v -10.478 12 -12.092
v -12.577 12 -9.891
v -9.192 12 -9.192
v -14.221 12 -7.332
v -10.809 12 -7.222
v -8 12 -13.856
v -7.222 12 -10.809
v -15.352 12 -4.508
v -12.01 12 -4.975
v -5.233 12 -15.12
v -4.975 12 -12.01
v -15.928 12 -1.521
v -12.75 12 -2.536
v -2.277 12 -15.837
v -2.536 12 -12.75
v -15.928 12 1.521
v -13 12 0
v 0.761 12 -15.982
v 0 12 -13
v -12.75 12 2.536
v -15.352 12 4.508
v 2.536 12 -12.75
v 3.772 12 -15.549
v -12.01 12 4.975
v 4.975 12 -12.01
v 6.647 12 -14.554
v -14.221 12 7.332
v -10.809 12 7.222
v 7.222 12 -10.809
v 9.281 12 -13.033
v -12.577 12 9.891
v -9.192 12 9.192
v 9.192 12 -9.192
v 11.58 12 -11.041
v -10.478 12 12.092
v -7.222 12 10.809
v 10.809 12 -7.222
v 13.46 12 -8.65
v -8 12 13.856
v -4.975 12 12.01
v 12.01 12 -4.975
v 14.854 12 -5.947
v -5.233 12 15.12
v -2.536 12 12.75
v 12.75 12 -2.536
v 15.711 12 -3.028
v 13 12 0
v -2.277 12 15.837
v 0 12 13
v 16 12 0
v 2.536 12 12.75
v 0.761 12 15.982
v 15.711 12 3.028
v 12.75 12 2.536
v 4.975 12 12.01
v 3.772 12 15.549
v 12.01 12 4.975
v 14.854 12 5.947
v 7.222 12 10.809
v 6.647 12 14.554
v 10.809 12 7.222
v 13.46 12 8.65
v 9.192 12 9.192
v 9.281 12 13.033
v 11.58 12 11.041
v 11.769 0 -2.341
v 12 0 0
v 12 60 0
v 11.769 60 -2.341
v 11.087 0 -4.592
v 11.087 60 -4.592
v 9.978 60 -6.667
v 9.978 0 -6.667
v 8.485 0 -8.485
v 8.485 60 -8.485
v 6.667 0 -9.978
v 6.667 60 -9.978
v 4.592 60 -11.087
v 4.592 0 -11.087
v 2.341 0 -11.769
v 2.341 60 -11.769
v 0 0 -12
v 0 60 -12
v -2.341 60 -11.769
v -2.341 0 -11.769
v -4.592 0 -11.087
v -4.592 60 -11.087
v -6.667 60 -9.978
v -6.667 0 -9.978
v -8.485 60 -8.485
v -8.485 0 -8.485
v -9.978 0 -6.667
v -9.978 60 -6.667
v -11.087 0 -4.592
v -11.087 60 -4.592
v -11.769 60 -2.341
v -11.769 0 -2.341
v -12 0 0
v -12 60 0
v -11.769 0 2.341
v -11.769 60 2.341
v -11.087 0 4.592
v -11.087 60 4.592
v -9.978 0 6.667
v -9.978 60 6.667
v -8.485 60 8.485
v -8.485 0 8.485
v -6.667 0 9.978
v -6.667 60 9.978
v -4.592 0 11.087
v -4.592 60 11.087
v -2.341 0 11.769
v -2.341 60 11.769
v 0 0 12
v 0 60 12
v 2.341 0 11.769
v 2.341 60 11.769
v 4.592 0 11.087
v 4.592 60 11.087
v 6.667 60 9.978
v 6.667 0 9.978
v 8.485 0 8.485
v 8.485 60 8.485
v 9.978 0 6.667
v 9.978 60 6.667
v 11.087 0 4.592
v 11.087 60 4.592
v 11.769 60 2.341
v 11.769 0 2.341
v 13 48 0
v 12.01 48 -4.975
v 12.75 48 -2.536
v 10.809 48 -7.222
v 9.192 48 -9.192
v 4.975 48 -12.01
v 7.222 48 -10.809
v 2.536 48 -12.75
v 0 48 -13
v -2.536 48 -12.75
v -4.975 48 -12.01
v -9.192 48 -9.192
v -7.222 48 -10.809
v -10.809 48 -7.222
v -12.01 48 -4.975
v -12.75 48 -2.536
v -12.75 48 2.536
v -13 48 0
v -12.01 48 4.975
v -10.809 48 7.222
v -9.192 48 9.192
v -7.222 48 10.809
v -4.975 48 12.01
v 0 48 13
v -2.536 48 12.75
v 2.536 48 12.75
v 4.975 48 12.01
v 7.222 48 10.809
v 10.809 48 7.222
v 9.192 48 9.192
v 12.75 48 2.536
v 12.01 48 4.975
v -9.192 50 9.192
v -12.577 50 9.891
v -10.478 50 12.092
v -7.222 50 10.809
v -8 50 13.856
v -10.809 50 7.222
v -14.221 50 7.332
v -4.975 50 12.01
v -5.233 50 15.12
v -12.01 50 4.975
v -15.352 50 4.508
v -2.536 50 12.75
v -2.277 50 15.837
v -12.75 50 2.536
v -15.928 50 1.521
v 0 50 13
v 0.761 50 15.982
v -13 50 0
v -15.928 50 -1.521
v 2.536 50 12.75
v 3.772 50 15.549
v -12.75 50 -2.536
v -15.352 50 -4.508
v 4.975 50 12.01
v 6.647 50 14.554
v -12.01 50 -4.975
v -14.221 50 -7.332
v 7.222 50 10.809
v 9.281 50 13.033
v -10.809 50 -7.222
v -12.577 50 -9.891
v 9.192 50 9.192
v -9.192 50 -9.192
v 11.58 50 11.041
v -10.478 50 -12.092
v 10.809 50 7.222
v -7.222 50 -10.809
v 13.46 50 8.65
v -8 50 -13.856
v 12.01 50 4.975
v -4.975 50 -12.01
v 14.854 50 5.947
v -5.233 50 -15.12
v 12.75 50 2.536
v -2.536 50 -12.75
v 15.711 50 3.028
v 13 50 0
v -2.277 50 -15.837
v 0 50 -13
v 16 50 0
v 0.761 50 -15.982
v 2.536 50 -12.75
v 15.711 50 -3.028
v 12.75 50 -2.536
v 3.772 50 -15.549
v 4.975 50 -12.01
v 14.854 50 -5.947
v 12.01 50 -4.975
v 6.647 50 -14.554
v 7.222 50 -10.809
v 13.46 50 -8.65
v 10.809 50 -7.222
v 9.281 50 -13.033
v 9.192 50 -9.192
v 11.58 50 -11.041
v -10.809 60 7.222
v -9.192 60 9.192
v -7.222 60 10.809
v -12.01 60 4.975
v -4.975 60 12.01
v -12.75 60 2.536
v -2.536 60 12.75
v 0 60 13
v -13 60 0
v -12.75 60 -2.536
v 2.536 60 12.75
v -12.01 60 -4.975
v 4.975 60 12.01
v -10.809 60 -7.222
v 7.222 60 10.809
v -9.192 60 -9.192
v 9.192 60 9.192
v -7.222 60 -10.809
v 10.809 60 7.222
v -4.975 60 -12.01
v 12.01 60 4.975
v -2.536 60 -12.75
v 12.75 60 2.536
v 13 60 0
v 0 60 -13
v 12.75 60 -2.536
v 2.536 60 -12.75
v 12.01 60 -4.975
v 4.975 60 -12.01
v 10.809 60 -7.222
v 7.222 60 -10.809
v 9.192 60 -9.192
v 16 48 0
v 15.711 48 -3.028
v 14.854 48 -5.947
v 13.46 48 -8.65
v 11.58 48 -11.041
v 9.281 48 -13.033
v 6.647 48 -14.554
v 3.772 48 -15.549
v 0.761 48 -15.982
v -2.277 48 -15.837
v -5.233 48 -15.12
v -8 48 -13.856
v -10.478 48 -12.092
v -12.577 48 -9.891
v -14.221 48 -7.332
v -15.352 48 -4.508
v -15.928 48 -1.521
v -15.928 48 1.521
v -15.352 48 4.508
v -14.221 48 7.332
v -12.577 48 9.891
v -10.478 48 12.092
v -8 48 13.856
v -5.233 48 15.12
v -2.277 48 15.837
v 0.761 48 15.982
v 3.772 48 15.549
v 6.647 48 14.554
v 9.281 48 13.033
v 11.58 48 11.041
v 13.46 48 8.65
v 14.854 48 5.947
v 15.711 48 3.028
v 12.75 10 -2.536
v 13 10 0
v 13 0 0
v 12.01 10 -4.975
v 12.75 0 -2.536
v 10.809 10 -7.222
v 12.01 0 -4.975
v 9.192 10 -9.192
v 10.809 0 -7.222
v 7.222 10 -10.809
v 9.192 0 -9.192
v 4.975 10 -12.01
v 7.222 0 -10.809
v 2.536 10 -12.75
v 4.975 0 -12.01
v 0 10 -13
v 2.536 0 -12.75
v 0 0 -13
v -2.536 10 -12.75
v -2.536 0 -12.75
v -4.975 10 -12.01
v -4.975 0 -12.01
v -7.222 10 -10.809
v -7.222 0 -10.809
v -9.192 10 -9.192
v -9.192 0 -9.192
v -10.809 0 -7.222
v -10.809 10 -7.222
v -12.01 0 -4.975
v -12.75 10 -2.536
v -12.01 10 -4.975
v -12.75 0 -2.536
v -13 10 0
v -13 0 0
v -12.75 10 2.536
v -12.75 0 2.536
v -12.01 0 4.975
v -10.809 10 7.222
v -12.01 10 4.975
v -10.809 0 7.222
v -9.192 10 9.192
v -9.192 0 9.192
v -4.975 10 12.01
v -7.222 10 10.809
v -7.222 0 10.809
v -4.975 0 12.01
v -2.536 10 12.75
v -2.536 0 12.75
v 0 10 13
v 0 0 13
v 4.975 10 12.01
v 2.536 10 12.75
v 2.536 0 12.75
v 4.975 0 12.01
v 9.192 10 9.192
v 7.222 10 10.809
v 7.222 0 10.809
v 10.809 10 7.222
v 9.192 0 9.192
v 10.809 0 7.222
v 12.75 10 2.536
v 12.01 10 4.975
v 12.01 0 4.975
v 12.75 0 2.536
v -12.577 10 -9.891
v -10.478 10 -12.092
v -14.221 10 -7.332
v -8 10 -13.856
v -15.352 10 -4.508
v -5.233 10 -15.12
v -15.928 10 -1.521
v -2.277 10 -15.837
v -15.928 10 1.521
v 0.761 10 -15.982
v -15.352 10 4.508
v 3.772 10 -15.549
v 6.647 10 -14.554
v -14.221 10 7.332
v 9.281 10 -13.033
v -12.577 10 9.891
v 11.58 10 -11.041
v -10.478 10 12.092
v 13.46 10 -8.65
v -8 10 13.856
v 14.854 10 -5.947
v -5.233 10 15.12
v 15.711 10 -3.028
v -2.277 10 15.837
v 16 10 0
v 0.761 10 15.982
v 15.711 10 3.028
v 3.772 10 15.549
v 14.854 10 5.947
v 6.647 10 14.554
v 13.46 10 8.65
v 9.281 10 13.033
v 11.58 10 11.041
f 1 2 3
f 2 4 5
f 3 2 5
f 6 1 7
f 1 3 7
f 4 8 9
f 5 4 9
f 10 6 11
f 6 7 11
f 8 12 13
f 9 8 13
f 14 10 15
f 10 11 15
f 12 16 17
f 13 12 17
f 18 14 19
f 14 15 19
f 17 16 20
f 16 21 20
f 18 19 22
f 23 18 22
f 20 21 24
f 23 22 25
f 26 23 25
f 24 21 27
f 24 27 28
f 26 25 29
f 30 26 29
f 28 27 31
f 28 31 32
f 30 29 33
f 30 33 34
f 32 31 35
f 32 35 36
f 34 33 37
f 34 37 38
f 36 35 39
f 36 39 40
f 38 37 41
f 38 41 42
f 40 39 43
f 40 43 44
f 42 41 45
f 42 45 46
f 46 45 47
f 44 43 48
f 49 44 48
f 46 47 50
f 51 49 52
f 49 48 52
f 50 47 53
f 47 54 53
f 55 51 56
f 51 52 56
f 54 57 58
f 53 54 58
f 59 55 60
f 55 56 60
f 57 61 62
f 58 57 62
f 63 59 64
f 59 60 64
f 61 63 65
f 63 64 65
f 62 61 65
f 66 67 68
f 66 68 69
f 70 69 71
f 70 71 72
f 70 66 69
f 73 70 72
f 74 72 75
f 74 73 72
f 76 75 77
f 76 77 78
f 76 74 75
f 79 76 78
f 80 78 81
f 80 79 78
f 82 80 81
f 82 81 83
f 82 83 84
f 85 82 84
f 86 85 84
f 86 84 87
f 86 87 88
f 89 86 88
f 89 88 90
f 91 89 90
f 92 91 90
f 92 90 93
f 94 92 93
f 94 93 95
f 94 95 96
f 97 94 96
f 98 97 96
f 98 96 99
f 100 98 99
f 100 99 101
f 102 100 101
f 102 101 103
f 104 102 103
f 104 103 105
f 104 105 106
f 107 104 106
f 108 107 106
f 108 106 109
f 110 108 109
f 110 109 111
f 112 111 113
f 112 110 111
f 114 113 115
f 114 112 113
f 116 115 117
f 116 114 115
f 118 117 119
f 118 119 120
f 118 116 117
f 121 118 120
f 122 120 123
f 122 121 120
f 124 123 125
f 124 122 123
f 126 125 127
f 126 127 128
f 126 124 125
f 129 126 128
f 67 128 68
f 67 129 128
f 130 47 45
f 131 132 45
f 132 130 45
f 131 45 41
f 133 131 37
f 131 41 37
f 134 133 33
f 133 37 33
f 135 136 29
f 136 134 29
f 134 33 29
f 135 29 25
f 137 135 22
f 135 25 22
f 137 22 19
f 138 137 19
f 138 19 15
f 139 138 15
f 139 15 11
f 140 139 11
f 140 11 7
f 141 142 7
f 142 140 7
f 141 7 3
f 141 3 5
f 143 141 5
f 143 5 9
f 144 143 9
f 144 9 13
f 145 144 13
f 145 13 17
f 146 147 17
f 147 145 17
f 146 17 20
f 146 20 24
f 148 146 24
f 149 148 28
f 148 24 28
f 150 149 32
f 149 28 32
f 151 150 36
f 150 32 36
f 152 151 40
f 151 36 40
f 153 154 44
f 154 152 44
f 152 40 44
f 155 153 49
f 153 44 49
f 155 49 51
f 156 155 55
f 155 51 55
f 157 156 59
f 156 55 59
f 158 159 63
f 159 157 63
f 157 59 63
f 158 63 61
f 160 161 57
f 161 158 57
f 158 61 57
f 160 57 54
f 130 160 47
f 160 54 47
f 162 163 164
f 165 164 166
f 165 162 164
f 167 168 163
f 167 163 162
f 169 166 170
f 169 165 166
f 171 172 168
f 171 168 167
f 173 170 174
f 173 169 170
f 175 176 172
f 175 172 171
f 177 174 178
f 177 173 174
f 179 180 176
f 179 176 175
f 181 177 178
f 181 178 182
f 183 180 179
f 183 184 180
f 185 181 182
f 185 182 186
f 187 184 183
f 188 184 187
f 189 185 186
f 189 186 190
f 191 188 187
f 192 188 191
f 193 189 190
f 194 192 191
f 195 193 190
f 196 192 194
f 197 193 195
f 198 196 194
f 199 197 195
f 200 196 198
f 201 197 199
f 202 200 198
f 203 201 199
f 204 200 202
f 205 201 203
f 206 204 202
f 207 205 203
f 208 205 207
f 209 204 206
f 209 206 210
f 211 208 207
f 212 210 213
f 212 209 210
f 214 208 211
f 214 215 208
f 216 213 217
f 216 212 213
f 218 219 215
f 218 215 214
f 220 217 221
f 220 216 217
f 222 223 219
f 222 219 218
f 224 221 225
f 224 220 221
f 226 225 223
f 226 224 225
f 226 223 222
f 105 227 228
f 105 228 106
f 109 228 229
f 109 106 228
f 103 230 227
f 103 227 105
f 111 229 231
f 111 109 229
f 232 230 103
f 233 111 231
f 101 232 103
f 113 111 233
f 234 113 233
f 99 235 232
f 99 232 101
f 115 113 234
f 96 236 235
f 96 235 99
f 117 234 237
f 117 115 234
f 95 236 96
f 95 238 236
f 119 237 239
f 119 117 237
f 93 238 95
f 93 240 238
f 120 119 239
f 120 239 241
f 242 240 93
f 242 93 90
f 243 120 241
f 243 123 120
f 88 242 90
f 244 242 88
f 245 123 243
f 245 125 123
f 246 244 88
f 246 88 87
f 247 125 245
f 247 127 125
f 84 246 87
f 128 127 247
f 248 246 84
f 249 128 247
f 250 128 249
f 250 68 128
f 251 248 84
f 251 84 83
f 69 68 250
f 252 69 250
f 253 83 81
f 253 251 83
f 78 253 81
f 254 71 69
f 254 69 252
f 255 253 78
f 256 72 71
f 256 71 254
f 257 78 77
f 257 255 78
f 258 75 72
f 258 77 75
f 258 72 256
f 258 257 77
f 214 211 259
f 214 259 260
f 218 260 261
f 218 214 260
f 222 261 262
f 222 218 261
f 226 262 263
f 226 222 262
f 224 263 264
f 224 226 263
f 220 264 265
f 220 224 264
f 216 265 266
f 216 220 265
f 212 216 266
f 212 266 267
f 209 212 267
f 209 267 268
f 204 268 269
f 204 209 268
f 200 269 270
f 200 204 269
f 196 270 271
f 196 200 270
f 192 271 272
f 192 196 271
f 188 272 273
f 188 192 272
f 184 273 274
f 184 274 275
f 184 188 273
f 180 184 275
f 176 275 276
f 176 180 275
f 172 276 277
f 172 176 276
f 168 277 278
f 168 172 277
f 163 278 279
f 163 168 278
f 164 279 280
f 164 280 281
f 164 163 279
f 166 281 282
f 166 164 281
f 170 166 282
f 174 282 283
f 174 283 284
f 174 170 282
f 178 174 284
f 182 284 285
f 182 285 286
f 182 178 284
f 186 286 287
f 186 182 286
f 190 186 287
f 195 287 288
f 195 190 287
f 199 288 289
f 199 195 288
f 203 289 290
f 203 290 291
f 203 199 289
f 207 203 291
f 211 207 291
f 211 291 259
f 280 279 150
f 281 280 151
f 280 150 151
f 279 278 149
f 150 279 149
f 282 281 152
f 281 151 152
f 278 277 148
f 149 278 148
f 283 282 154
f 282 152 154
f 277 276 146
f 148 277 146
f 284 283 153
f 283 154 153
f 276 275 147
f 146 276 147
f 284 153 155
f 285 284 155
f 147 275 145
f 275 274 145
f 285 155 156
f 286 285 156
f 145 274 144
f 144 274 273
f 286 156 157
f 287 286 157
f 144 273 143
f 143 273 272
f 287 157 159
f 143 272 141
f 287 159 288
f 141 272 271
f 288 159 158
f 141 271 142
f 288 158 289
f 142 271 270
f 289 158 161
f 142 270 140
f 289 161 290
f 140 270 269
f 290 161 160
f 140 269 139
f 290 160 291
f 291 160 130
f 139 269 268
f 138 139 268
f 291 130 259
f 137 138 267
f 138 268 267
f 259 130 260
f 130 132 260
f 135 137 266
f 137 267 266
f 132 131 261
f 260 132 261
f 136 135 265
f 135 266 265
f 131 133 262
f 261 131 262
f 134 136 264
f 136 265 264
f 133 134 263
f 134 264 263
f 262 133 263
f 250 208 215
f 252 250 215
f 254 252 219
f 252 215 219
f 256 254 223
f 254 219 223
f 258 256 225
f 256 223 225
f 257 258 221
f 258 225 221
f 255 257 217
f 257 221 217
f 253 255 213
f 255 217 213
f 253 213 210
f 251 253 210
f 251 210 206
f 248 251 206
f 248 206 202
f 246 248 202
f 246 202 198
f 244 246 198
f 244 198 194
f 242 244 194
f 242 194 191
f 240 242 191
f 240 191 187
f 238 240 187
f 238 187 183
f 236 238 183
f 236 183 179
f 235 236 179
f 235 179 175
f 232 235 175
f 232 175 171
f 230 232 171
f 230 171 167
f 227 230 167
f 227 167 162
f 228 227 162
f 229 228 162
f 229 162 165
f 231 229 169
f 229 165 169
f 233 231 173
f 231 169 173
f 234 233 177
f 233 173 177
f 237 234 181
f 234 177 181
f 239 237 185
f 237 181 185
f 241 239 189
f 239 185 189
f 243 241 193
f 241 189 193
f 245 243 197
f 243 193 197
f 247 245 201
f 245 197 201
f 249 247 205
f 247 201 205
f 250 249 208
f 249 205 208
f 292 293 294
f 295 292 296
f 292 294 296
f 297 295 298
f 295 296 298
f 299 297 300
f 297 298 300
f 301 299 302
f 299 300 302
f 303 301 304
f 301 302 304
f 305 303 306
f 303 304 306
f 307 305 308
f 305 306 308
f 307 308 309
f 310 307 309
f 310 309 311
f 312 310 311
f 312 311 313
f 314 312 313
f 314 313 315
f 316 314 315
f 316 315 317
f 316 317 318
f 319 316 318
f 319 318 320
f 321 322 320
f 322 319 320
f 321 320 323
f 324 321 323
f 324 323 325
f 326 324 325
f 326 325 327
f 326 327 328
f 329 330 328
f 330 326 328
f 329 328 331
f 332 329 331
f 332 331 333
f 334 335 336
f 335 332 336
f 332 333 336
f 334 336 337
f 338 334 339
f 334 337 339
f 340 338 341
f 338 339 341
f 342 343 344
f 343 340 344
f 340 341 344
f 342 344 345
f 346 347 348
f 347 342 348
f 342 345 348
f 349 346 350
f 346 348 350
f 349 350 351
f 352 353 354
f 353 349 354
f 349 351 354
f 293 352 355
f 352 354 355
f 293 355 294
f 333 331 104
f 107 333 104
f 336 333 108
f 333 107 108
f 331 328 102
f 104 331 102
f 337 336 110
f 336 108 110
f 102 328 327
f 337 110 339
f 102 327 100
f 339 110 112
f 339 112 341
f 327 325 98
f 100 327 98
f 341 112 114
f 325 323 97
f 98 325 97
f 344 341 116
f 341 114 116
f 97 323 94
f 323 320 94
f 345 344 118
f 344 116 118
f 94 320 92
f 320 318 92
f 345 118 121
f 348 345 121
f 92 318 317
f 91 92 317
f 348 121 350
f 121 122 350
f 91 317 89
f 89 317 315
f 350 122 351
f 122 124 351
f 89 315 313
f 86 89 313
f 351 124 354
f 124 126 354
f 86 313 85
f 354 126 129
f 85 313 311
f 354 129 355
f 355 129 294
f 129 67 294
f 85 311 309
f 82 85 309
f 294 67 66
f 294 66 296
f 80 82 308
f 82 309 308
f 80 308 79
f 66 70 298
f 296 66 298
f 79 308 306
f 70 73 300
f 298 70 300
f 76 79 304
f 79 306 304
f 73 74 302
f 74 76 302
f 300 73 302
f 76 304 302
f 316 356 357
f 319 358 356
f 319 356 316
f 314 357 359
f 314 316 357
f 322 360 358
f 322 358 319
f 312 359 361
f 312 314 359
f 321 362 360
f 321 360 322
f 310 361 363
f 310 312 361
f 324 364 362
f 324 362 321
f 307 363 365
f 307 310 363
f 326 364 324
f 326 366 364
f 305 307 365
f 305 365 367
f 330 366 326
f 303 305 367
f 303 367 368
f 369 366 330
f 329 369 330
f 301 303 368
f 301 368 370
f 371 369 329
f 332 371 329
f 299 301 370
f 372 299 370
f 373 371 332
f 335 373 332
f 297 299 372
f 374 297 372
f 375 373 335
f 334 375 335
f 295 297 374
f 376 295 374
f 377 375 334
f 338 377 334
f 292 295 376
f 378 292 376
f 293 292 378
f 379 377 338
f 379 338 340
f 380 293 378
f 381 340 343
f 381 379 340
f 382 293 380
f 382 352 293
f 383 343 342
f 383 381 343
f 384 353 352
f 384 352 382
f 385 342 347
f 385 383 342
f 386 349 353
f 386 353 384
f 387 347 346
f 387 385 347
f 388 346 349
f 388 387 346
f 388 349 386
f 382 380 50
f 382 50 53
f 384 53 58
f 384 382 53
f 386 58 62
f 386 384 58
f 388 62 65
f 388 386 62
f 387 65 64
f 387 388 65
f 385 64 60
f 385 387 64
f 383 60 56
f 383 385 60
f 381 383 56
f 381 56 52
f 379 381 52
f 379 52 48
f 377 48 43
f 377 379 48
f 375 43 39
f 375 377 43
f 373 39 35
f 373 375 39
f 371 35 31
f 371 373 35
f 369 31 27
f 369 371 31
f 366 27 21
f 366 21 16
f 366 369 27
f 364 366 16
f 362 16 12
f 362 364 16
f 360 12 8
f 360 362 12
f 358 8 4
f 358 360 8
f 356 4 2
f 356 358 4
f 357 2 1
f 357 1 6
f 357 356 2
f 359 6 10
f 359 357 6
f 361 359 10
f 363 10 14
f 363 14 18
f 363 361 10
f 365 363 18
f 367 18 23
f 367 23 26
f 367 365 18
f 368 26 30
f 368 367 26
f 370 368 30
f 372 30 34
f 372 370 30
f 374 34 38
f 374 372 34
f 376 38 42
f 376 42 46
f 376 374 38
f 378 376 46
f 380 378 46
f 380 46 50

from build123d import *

# Parameters (mm, degrees)
SKETCH_1_R      = 13
SKETCH_1_R_2    = 12
EXTRUDE_1_DEPTH = 60
EXTRUDE_START   = -10
SKETCH_2_R      = 16
SKETCH_2_R_2    = 12
EXTRUDE_3_DEPTH = 2
SKETCH_3_R      = 16
SKETCH_3_R_2    = 12
EXTRUDE_4_DEPTH = 2


with BuildPart() as part:
    # Эскиз1 → Бобышка-Вытянуть1 (new body)
    with BuildSketch(Plane(origin=(0, 0, 0), x_dir=(1, 0, 0), z_dir=(0, 1, 0))):
        Circle(SKETCH_1_R)
        Circle(SKETCH_1_R_2, mode=Mode.SUBTRACT)
    extrude(amount=EXTRUDE_1_DEPTH)

    # Эскиз2 → Бобышка-Вытянуть3 (add)
    with BuildSketch(Plane(origin=(0, 60, 0), x_dir=(1, 0, 0), z_dir=(0, 1, 0)).offset(EXTRUDE_START)):
        Circle(SKETCH_2_R)
        Circle(SKETCH_2_R_2, mode=Mode.SUBTRACT)
    extrude(amount=-EXTRUDE_3_DEPTH)

    # Эскиз3 → Бобышка-Вытянуть4 (add)
    with BuildSketch(Plane.XZ.offset(EXTRUDE_START)):
        Circle(SKETCH_3_R)
        Circle(SKETCH_3_R_2, mode=Mode.SUBTRACT)
    extrude(amount=-EXTRUDE_4_DEPTH)


solid = part.part
